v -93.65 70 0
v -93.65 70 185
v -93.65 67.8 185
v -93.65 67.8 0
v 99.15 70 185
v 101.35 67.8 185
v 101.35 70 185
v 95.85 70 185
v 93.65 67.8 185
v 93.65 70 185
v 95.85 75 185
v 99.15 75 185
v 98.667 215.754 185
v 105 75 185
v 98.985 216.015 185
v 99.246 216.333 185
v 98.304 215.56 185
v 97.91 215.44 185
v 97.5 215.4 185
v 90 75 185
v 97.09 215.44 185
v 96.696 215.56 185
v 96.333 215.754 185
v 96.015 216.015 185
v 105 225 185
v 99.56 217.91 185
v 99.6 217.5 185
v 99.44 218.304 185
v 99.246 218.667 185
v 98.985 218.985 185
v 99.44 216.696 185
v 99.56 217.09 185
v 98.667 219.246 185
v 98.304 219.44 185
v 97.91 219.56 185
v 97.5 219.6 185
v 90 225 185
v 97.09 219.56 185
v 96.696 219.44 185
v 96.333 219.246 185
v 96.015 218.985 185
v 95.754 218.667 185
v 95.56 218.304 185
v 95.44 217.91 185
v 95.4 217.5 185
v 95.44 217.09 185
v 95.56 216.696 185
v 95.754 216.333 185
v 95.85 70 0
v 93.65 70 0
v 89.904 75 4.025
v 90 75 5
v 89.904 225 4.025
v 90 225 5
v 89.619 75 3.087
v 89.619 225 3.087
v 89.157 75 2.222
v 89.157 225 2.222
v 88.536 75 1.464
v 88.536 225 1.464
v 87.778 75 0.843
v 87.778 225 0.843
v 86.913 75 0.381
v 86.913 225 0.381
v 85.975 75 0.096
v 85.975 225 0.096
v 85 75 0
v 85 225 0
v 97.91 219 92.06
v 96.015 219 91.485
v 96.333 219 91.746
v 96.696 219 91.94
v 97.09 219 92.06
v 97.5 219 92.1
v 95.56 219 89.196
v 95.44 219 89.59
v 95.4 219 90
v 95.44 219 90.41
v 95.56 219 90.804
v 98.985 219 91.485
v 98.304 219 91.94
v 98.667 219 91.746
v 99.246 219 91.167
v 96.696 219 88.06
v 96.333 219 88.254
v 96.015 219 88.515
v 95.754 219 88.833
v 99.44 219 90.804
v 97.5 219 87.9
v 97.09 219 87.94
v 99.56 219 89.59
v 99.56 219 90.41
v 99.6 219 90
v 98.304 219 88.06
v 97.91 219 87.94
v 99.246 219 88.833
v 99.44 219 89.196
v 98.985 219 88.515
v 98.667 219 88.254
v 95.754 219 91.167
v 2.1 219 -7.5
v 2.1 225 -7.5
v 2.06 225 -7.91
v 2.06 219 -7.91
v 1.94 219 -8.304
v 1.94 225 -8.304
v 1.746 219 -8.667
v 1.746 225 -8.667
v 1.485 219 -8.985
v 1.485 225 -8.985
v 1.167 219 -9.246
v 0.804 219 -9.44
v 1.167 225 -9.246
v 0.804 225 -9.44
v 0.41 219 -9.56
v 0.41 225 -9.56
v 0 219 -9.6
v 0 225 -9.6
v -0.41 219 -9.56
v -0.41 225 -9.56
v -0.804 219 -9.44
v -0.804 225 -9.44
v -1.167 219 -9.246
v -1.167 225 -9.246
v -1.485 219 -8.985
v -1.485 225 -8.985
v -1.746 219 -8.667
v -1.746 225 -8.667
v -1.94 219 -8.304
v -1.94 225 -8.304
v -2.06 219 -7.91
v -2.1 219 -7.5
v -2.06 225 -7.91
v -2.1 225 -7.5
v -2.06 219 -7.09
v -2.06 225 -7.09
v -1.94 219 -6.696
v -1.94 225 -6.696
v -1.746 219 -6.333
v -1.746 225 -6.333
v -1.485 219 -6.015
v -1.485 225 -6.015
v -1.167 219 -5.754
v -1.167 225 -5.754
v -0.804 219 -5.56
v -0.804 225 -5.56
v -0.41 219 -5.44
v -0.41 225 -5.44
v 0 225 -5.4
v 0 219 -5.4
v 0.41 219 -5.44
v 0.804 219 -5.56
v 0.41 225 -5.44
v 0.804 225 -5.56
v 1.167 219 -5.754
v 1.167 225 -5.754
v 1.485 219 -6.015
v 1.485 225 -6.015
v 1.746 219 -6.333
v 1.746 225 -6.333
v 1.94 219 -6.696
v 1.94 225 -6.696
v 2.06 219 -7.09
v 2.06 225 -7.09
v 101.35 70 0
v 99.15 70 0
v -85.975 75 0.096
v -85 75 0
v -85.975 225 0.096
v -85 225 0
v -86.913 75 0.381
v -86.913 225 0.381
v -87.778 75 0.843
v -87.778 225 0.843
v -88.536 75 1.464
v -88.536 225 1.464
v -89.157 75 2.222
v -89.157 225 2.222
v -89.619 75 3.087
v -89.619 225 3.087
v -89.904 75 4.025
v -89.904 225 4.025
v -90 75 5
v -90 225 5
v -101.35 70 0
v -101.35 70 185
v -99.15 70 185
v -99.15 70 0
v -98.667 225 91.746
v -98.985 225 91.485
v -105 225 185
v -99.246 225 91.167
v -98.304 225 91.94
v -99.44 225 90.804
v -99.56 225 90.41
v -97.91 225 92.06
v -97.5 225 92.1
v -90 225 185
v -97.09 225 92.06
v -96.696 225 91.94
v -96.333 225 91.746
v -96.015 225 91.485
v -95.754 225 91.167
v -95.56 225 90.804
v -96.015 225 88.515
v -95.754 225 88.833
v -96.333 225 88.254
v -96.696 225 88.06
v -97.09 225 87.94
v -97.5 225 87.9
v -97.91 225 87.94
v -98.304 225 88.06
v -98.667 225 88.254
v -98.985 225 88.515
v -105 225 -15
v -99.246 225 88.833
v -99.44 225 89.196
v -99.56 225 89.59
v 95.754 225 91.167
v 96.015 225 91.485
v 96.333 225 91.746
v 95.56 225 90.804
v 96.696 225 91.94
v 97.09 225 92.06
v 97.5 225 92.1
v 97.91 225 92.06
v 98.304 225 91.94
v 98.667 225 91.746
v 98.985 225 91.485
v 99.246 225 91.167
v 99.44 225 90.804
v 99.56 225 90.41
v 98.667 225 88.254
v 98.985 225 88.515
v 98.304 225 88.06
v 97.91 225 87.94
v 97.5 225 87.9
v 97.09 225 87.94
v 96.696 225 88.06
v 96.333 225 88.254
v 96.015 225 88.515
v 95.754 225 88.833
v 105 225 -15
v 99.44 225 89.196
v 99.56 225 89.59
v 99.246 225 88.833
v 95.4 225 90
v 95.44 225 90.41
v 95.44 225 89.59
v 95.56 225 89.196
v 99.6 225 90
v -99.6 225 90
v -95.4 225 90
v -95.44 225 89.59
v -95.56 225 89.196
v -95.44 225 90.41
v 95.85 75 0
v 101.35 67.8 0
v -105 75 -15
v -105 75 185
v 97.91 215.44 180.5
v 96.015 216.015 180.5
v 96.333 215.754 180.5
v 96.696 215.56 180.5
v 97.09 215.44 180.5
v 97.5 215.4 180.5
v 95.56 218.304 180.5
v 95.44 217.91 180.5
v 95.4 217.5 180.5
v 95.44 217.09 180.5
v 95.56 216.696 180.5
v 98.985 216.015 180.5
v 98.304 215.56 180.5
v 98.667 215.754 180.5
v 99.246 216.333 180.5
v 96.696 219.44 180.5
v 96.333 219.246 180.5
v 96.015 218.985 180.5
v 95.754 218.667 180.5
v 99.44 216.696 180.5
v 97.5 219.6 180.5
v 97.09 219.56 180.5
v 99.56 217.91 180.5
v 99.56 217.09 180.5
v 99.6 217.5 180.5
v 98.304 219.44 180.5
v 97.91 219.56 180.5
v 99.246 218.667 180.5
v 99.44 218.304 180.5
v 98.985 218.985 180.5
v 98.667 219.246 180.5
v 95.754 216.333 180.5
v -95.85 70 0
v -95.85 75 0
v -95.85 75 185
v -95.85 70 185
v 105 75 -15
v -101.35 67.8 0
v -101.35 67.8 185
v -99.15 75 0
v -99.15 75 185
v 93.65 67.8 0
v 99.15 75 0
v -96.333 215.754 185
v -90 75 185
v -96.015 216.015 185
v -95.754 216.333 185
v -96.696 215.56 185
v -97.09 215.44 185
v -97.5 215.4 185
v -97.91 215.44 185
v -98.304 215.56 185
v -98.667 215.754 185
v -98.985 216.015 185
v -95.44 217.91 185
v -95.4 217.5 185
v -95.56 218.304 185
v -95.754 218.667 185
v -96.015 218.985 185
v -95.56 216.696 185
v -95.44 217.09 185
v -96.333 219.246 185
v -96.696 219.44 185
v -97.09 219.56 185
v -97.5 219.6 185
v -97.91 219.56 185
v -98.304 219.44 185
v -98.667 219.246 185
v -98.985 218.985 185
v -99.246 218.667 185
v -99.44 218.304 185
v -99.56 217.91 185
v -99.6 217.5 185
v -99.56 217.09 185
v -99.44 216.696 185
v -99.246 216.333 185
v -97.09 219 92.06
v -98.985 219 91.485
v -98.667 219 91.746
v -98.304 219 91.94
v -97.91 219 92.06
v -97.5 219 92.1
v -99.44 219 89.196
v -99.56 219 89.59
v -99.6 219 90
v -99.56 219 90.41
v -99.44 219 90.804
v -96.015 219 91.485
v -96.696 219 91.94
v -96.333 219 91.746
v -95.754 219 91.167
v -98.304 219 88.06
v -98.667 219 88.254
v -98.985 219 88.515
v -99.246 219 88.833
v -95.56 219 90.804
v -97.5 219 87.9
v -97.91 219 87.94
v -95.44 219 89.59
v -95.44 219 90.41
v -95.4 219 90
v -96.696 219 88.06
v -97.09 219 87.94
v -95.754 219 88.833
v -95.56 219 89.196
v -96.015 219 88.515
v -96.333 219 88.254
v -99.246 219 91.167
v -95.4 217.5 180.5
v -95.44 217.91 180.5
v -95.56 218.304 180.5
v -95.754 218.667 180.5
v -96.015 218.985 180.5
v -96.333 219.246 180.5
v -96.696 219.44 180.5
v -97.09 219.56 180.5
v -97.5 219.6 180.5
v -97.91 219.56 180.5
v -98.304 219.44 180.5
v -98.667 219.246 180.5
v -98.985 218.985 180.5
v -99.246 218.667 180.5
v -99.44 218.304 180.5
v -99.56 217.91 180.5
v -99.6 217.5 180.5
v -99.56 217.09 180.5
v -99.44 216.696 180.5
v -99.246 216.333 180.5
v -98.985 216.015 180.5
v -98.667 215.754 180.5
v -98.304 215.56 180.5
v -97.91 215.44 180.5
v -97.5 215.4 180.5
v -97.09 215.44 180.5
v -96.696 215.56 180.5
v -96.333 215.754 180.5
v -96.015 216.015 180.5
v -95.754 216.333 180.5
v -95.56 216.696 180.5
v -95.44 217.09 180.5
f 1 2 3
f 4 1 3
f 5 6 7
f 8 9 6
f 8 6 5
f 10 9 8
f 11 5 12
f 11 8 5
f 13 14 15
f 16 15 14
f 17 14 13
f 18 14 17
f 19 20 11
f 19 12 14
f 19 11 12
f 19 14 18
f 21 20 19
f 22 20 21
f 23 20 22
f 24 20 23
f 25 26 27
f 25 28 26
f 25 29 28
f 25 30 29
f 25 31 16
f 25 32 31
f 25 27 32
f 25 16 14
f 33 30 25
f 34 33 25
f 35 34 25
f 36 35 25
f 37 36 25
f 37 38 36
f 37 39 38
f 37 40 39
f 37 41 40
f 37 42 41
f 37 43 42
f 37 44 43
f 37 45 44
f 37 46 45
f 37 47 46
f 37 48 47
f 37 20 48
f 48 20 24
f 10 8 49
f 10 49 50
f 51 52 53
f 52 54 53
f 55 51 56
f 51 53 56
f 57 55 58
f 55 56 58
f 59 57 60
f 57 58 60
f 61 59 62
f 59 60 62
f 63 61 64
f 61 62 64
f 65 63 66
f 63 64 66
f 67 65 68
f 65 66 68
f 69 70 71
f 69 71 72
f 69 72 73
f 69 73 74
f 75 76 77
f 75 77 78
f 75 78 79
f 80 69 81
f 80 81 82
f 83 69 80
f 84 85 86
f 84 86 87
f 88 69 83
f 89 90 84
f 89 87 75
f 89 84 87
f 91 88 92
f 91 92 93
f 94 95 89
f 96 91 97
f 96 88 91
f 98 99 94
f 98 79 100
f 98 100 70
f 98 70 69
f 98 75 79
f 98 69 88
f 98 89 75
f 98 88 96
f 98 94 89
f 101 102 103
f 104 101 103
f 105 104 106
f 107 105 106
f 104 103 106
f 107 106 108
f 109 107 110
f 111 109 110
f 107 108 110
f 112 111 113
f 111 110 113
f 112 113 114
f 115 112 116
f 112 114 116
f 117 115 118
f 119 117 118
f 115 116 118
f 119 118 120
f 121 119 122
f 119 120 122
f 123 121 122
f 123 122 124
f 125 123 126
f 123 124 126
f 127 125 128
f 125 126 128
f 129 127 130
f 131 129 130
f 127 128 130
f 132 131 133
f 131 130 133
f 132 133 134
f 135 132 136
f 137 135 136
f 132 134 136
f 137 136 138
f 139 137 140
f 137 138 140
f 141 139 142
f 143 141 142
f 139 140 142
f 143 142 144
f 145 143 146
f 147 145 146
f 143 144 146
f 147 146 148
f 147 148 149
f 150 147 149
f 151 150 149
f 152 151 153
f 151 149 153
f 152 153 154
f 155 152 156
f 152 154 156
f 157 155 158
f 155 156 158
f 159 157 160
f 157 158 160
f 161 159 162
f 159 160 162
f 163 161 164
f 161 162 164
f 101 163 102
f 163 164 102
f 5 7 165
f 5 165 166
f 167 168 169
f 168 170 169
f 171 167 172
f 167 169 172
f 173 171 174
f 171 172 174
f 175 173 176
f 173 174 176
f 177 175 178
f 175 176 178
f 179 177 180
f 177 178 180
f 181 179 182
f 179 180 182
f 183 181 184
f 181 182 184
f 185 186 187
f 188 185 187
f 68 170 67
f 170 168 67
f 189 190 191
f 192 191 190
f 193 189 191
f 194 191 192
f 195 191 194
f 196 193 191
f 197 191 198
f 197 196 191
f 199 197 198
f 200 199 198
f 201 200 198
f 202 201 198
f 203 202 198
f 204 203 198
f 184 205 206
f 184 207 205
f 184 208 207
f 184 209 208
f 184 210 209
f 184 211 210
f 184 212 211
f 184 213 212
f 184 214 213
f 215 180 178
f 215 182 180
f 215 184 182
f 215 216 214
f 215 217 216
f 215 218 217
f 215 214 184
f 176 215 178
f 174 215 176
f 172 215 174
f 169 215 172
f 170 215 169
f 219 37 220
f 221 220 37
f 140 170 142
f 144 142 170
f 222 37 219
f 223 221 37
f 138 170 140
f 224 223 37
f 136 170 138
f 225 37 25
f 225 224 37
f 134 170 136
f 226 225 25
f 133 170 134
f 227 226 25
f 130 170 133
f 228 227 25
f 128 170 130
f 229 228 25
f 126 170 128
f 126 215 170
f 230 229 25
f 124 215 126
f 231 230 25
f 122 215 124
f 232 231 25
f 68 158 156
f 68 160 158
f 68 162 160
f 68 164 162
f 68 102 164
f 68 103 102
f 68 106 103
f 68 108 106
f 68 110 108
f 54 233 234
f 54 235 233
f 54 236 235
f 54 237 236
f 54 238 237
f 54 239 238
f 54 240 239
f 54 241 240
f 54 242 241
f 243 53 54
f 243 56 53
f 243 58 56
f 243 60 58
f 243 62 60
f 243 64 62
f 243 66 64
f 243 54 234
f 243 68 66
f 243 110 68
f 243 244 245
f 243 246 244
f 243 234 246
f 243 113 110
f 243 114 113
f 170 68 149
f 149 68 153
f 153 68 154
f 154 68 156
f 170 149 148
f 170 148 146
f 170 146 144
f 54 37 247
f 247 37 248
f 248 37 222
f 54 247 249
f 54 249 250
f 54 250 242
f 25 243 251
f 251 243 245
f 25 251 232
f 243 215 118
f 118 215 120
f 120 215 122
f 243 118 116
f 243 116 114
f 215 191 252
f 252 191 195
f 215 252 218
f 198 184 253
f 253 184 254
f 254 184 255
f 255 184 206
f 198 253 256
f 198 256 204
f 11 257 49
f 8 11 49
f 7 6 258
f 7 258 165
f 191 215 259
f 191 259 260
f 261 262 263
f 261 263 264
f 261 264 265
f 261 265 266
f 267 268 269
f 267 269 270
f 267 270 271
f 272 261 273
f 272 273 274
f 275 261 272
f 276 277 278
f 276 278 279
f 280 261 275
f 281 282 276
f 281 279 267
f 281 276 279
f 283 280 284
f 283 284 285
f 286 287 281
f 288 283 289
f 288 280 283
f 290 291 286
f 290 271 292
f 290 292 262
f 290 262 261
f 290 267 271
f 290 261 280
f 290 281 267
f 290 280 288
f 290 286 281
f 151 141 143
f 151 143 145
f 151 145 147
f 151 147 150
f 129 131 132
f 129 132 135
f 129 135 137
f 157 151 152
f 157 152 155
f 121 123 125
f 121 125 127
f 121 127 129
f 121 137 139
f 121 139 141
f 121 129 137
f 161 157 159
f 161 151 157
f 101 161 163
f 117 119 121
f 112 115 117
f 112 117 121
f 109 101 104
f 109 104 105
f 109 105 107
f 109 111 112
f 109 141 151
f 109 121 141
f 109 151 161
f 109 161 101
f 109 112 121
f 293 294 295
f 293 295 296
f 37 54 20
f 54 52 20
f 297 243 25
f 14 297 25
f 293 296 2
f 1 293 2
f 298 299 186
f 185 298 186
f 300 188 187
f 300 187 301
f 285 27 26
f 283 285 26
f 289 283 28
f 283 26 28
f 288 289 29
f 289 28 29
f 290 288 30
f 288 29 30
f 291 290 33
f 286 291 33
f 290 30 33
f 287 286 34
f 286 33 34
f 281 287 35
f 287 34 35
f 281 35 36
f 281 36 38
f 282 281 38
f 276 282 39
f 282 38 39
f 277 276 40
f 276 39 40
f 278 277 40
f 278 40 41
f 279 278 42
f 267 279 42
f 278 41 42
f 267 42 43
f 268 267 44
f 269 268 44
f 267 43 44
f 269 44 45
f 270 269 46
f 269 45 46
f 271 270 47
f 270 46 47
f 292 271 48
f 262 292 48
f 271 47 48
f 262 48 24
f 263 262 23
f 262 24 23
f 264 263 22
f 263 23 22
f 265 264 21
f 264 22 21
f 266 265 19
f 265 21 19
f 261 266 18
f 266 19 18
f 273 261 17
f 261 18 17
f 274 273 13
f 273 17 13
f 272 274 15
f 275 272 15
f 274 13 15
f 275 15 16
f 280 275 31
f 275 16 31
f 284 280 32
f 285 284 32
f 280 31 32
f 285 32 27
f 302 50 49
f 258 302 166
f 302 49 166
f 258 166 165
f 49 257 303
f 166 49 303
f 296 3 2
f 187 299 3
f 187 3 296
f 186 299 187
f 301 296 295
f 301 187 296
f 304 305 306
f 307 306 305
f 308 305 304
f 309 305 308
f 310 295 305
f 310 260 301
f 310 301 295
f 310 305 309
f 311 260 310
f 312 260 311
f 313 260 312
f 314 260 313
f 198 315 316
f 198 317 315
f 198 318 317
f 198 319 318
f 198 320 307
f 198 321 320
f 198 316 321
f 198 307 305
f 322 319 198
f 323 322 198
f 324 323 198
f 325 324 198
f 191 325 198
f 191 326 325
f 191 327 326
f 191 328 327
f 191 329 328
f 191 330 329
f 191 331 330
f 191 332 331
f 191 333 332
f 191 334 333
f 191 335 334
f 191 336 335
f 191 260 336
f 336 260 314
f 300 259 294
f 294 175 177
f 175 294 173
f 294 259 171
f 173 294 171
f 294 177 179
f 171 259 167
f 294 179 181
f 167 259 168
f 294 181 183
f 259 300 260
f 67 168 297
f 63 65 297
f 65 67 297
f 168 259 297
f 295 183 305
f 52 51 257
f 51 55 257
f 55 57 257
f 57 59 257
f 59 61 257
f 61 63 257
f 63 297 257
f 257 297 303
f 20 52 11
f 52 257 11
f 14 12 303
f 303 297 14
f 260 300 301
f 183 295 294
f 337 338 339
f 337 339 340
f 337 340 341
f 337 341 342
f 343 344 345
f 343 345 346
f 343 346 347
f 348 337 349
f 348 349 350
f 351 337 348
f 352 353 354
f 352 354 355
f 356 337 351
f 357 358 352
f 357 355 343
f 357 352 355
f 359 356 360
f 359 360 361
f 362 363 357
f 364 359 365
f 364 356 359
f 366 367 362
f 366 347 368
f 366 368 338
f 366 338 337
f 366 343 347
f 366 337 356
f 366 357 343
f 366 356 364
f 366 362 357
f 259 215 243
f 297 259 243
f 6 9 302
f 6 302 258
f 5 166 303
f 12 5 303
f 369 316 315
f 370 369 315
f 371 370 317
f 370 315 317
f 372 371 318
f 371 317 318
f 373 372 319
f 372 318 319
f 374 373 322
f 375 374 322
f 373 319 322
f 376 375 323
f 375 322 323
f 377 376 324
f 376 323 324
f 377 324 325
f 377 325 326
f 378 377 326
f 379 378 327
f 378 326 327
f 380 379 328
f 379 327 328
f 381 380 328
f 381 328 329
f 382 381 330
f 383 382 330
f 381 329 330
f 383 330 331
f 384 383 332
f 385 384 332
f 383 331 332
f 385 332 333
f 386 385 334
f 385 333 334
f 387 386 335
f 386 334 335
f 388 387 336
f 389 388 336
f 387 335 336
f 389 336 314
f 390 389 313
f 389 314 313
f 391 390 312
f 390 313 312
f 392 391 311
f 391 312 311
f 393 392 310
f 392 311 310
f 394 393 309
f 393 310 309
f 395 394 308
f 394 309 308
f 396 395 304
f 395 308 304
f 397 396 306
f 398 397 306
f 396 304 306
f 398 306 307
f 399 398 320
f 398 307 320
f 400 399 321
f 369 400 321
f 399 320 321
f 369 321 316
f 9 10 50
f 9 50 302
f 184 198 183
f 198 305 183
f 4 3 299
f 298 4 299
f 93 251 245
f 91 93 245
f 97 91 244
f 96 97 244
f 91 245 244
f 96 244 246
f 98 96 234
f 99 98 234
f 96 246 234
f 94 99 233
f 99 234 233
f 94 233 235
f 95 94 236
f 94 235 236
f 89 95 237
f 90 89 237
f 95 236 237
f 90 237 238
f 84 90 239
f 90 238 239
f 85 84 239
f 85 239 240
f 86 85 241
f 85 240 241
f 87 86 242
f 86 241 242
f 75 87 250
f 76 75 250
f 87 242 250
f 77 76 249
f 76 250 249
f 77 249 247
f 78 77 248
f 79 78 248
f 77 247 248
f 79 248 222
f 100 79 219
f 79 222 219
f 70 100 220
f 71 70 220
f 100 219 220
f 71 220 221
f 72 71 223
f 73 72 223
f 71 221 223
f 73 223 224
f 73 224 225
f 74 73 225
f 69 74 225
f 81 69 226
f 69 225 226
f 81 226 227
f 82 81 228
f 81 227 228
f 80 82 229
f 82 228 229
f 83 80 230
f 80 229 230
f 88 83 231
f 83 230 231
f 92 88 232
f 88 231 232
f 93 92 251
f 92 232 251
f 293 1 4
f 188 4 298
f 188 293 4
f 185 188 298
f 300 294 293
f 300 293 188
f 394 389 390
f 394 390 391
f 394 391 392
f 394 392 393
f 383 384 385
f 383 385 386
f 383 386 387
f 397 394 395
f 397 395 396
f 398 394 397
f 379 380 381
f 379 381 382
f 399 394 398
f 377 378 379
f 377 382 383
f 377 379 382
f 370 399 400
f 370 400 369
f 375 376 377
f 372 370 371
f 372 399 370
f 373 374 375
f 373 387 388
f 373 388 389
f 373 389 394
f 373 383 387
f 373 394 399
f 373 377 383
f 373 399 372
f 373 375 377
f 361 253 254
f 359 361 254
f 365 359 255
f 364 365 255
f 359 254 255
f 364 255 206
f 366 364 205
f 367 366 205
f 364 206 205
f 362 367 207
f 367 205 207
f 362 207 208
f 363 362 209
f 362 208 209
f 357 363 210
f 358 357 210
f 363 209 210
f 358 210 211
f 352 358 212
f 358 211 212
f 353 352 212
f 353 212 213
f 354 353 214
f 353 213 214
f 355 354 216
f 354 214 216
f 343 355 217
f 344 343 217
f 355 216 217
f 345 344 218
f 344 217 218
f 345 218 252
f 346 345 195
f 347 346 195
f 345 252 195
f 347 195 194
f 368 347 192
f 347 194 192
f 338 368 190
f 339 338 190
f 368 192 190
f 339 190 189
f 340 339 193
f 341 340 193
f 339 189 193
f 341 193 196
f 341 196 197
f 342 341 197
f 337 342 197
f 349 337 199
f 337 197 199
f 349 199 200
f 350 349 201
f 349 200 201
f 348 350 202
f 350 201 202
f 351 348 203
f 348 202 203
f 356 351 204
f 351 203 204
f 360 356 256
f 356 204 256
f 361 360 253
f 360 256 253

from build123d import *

# Parameters (mm, degrees)
BOSS_EXTRUDE1_DEPTH = 225
BOSS_EXTRUDE2_DEPTH = 10
SKETCH6_W           = 210
SKETCH6_H           = 200
BOSS_EXTRUDE3_DEPTH = 15
SKETCH5_R           = 2.1
CUT_EXTRUDE1_DEPTH  = 4.5
SKETCH10_W          = 210
SKETCH10_H          = 200
BOSS_EXTRUDE4_DEPTH = 40
SKETCH11_R          = 5
BOSS_EXTRUDE5_DEPTH = 5
BOSS_EXTRUDE5_TAPER = 5
SKETCH13_W          = 185
SKETCH13_H          = 10
BOSS_EXTRUDE6_DEPTH = 47.5
SKETCH14_W          = 185
SKETCH14_H          = 10
BOSS_EXTRUDE7_DEPTH = 47.5
SKETCH7_W           = 21
SKETCH7_H           = 10.25
CUT_EXTRUDE2_DEPTH  = 15
SKETCH15_R          = 2.1
CUT_EXTRUDE4_DEPTH  = 6
BOSS_EXTRUDE8_DEPTH = 185
FILLET1_R           = 5


with BuildPart() as part:
    # Sketch2 → Boss-Extrude1 (new body)
    with BuildSketch(Plane(origin=(0, 0, 0), x_dir=(1, 0, 0), z_dir=(0, 1, 0))):
        Polygon((-90, 0), (90, 0), (90, -185), (105, -185), (105, 15), (-105, 15), (-105, -185), (-90, -185), align=None)
    extrude(amount=BOSS_EXTRUDE1_DEPTH)

    # Sketch3 → Boss-Extrude2 (add)
    with BuildSketch(Plane(origin=(0, 10, 0), x_dir=(1, 0, 0), z_dir=(0, 1, 0))):
        Polygon((-90, -185), (-22.5, -185), (-22.5, -10), (22.5, -10), (22.5, -185), (90, -185), (90, 0), (-90, 0), align=None)
    extrude(amount=BOSS_EXTRUDE2_DEPTH)

    # Sketch6 → Boss-Extrude3 (add)
    with BuildSketch(Plane.XZ):
        with Locations((0, 85)):
            Rectangle(SKETCH6_W, SKETCH6_H)
    extrude(amount=BOSS_EXTRUDE3_DEPTH)

    # Sketch5 → Cut-Extrude1 (cut)
    with BuildSketch(Plane.XY.offset(185)):
        with Locations((-97.5, 217.5)):
            Circle(SKETCH5_R)
        with Locations((97.5, 217.5)):
            Circle(SKETCH5_R)
        with Locations((-97.5, -7.5)):
            Circle(SKETCH5_R)
        with Locations((97.5, -7.5)):
            Circle(SKETCH5_R)
    extrude(amount=-CUT_EXTRUDE1_DEPTH, mode=Mode.SUBTRACT)

    # Sketch10 → Boss-Extrude4 (add)
    with BuildSketch(Plane.XZ.offset(15)):
        with Locations((0, 85)):
            Rectangle(SKETCH10_W, SKETCH10_H)
    extrude(amount=BOSS_EXTRUDE4_DEPTH)

    # Sketch11 → Boss-Extrude5 (add)
    with BuildSketch(Plane(origin=(0, 0, 0), x_dir=(1, 0, 0), z_dir=(0, 1, 0))):
        with Locations((0, -90)):
            Circle(SKETCH11_R)
    extrude(amount=BOSS_EXTRUDE5_DEPTH, taper=BOSS_EXTRUDE5_TAPER)

    # Sketch13 → Boss-Extrude6 (add)
    with BuildSketch(Plane.ZY.offset(-90)):
        with Locations((92.5, 5)):
            Rectangle(SKETCH13_W, SKETCH13_H)
    extrude(amount=BOSS_EXTRUDE6_DEPTH)

    # Sketch14 → Boss-Extrude7 (add)
    with BuildSketch(Plane(origin=(-90, 0, 0), x_dir=(0, 0, -1), z_dir=(1, 0, 0))):
        with Locations((-92.5, 5)):
            Rectangle(SKETCH14_W, SKETCH14_H)
    extrude(amount=BOSS_EXTRUDE7_DEPTH)

    # Sketch7 → Cut-Extrude2 (cut)
    with BuildSketch(Plane(origin=(0, 0, -15), x_dir=(-1, 0, 0), z_dir=(0, 0, -1))):
        with Locations((-32, 5.125)):
            Rectangle(SKETCH7_W, SKETCH7_H)
    extrude(amount=-CUT_EXTRUDE2_DEPTH, mode=Mode.SUBTRACT)

    # Sketch15 → Cut-Extrude4 (cut)
    with BuildSketch(Plane(origin=(0, 225, 0), x_dir=(1, 0, 0), z_dir=(0, 1, 0))):
        with Locations((0, 7.5)):
            Circle(SKETCH15_R)
        with Locations((-97.5, -90)):
            Circle(SKETCH15_R)
        with Locations((97.5, -90)):
            Circle(SKETCH15_R)
    extrude(amount=-CUT_EXTRUDE4_DEPTH, mode=Mode.SUBTRACT)

    # Split1
    split(bisect_by=Plane.ZX.offset(75), keep=Keep.TOP)

    # Sketch16 → Boss-Extrude8 (add)
    with BuildSketch(Plane.XY.offset(185)):
        Polygon((-99.15, 75), (-95.85, 75), (-95.85, 70), (-93.65, 70), (-93.65, 67.8), (-101.35, 67.8), (-101.35, 70), (-99.15, 70), align=None)
        Polygon((101.35, 70), (99.15, 70), (99.15, 75), (95.85, 75), (95.85, 70), (93.65, 70), (93.65, 67.8), (101.35, 67.8), align=None)
    extrude(amount=-BOSS_EXTRUDE8_DEPTH)

    # Fillet1
    fillet1_edges = [part.edges().sort_by_distance(p)[0] for p in [
        (90, 150, 0),
        (-90, 150, 0),
    ]]
    fillet(fillet1_edges, radius=FILLET1_R)


solid = part.part
